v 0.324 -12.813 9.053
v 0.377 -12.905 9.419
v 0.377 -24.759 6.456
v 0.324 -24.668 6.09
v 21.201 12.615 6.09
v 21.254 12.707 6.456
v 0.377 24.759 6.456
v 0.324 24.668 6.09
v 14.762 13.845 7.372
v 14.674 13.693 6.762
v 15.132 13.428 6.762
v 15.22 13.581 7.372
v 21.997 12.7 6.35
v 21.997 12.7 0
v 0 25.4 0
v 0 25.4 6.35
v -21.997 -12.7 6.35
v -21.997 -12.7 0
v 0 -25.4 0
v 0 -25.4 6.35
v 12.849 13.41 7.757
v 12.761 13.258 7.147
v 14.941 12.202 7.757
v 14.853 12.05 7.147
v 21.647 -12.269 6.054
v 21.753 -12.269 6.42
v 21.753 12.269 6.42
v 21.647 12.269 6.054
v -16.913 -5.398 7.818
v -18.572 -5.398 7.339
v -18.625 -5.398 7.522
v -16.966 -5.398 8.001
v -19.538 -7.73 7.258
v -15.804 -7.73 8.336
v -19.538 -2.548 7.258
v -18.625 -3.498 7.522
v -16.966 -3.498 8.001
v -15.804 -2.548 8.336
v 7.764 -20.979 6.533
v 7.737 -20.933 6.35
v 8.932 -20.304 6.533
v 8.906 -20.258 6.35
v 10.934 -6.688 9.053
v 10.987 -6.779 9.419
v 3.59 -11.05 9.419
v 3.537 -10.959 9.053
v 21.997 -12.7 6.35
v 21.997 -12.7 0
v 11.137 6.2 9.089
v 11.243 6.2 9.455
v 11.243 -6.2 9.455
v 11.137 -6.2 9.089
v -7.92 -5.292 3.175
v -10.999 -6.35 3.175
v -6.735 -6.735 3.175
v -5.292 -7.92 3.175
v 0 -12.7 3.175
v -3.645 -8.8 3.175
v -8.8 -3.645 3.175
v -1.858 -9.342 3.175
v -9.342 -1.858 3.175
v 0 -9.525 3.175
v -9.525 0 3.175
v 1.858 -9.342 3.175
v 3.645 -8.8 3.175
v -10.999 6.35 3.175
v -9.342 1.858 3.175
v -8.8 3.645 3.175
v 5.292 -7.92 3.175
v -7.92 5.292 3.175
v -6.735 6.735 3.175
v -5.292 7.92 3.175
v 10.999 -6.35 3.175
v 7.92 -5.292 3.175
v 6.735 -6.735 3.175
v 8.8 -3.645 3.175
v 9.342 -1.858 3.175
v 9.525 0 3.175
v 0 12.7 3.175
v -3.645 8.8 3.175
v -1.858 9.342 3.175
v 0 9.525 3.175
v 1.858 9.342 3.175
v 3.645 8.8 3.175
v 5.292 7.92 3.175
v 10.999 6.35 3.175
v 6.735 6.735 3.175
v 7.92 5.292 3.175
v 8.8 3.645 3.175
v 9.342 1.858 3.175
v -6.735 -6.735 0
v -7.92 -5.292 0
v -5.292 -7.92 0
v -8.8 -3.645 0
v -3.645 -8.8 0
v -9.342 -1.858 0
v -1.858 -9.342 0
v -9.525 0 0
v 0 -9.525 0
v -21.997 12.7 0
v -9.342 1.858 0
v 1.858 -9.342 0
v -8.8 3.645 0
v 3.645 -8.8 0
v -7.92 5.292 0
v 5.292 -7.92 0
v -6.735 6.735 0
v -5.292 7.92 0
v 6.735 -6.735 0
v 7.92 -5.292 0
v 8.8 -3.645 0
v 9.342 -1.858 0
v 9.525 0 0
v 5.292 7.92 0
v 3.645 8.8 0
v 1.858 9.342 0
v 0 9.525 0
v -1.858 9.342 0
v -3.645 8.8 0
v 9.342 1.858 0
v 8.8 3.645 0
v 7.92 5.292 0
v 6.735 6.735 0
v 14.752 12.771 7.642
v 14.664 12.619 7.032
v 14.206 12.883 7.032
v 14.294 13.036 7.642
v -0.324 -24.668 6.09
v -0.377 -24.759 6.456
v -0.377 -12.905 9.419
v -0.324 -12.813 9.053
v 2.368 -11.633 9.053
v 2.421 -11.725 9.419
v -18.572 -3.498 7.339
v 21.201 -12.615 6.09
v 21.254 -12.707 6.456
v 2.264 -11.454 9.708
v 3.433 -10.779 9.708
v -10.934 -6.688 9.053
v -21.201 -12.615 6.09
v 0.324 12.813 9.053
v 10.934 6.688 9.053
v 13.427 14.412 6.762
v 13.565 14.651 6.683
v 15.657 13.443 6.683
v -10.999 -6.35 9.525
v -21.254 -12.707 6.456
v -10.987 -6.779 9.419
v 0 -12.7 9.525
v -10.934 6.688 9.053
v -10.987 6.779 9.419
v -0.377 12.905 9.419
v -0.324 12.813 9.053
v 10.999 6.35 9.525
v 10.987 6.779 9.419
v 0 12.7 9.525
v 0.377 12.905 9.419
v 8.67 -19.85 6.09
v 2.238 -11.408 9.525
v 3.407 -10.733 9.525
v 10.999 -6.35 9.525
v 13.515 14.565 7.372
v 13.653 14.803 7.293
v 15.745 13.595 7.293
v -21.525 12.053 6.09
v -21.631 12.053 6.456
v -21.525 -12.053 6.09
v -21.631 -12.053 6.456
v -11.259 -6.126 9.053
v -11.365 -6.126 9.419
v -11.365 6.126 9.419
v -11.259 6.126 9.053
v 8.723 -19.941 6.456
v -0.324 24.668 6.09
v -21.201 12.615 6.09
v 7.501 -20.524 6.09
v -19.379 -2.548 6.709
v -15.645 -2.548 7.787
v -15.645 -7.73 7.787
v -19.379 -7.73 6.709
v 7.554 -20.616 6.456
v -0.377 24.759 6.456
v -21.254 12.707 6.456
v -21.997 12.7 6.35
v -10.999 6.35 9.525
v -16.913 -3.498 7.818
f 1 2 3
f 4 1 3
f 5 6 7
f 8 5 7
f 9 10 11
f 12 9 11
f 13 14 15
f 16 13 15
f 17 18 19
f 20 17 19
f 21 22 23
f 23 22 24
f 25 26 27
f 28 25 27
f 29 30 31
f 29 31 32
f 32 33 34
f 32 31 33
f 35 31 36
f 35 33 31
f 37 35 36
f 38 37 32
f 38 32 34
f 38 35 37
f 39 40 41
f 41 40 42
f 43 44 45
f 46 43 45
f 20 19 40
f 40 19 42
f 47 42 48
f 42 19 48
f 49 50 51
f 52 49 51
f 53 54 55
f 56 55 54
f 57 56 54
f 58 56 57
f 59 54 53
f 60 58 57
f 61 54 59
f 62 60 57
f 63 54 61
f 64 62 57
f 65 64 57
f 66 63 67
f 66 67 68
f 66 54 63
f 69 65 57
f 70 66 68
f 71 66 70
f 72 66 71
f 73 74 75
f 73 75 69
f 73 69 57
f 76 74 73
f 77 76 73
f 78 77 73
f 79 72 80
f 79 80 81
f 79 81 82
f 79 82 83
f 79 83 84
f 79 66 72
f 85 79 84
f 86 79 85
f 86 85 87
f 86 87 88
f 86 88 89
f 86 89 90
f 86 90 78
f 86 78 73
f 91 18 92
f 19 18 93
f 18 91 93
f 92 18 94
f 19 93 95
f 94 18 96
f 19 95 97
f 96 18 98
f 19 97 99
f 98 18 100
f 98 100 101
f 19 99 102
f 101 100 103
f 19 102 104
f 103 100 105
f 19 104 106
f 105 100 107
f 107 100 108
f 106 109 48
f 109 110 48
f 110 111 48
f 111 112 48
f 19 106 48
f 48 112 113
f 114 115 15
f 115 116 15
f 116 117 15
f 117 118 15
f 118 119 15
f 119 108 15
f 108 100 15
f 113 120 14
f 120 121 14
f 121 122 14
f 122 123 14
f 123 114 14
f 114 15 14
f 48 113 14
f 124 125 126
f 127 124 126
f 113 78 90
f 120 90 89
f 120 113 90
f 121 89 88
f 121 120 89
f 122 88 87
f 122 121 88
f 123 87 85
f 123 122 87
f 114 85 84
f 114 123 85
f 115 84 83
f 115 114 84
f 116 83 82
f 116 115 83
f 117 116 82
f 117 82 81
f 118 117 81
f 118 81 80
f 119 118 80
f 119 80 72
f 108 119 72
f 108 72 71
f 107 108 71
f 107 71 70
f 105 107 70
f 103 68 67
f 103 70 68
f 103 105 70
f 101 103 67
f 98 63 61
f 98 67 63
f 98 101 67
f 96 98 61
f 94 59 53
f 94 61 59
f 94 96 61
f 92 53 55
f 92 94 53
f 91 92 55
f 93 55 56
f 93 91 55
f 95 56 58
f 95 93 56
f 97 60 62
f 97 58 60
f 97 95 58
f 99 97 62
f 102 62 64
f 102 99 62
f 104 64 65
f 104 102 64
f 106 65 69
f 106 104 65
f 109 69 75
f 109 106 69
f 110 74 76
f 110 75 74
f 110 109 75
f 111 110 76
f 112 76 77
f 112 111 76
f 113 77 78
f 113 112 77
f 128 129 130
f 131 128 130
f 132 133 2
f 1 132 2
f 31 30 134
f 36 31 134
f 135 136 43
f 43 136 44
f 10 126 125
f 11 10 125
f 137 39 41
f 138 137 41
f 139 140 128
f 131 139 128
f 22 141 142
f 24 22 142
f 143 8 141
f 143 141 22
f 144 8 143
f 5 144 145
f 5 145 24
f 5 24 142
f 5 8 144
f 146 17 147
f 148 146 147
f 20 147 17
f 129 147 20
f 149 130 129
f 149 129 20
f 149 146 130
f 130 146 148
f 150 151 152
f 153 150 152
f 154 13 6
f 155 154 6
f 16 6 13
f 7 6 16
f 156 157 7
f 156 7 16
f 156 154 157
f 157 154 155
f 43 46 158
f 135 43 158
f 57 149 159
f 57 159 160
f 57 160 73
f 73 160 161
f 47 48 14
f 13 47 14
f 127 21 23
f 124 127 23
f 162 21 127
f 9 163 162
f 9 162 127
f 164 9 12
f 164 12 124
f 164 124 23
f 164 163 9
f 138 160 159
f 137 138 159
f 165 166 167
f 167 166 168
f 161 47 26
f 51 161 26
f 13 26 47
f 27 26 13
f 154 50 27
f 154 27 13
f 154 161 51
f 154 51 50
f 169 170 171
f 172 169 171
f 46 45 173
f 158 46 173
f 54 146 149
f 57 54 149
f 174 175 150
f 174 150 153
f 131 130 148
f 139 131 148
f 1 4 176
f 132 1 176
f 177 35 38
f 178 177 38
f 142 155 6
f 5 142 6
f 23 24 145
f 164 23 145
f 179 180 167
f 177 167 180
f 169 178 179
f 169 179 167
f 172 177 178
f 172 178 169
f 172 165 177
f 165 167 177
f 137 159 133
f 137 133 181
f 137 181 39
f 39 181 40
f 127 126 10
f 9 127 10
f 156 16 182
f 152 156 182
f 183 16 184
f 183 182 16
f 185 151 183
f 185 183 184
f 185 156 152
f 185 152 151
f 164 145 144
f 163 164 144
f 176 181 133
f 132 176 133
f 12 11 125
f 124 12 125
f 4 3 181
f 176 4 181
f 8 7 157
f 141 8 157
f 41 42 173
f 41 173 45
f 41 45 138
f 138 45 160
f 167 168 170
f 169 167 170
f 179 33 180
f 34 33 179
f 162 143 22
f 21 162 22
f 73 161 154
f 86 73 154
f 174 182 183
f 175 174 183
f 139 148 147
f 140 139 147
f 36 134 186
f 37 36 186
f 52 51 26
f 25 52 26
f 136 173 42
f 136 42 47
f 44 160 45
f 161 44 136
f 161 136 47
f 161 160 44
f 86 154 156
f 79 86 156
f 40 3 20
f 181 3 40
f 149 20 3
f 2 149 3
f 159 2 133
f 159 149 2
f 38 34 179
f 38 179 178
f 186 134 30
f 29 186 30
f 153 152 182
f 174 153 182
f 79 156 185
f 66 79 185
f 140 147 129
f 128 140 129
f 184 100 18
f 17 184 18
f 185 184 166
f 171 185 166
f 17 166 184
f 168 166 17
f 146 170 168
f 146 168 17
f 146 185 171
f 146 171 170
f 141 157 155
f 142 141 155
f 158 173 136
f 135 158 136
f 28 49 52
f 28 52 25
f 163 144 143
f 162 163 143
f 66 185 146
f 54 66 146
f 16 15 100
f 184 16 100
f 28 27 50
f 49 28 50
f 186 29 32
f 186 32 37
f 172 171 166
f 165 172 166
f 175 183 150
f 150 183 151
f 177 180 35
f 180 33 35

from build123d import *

# Parameters (mm, degrees)
F0_R      = 9.525
F1_DEPTH  = 6.35
F2_R      = 9.525
F3_DEPTH  = 3.175
F8_DEPTH  = 6.35
F9_W      = 3.8866475224
F9_H      = 5.1821961533
F9_W_2    = 1.7273994163
F9_H_2    = 1.9001385663
F10_DEPTH = 0.1905
F12_DEPTH = 0.1905
F13_DEPTH = 0.381
F15_DEPTH = 0.381
F17_DEPTH = 0.381
F18_W     = 3.8866475224
F18_H     = 5.1821961533
F19_DEPTH = 0.381
F21_DEPTH = 0.381
F23_DEPTH = 0.381
F25_DEPTH = 0.635


# Not quite as in the source:
# - a feature names something its author has since deleted; it is built from what else it names


with BuildPart() as f1:
    # F0 (on Top) → F1 (new body)
    with BuildSketch(Plane.XY):
        Polygon((21.9970452561, 12.7), (0, 25.4), (-21.9970452561, 12.7), (-21.9970452561, -12.7), (0, -25.4), (21.9970452561, -12.7), align=None)
        Polygon((-10.9985226281, 6.35), (0, 12.7), (10.9985226281, 6.35), (10.9985226281, -6.35), (0, -12.7), (-10.9985226281, -6.35), align=None, mode=Mode.SUBTRACT)
        Polygon((10.9985226281, 6.35), (0, 12.7), (-10.9985226281, 6.35), (-10.9985226281, -6.35), (0, -12.7), (10.9985226281, -6.35), align=None)
        Circle(F0_R, mode=Mode.SUBTRACT)
    extrude(amount=F1_DEPTH)

    # F2 (on face) → F3 (join)
    with BuildSketch(Plane.XY.offset(6.35)):
        Polygon((-10.9985226281, 6.35), (-10.9985226281, -6.35), (0, -12.7), (10.9985226281, -6.35), (10.9985226281, 6.35), (0, 12.7), align=None)
        Circle(F2_R, mode=Mode.SUBTRACT)
    extrude(amount=F3_DEPTH)

    # F4 (on face) → F6 section 0
    with BuildSketch(Plane.XY.offset(6.35)):
        Polygon((0, -25.4), (21.9970452561, -12.7), (21.9970452561, 12.7), (0, 25.4), (-21.9970452561, 12.7), (-21.9970452561, -12.7), align=None)
    # F5 (on face) → F6 section 1
    with BuildSketch(Plane.XY.offset(9.525)):
        Polygon((0, -12.7), (10.9985226281, -6.35), (10.9985226281, 6.35), (0, 12.7), (-10.9985226281, 6.35), (-10.9985226281, -6.35), align=None)
    loft()

    # F8 (cut): a face of the model
    f8_faces = [f1.faces().sort_by_distance(p)[0] for p in [
        (0, 0, 9.525),
    ]]
    extrude(f8_faces, amount=-F8_DEPTH, mode=Mode.SUBTRACT)

    # F9 (on face) → F10 (join)
    with BuildSketch(Plane(origin=(-3.3841608086, 0, 11.7230769231), x_dir=(0.9607689228, 0, 0.2773500981), z_dir=(-0.2773500981, 0, 0.9607689228))):
        with Locations((-14.8150864989, -5.1390115405)):
            Rectangle(F9_W, F9_H)
        with Locations((-14.9446423166, -4.4480519136)):
            Rectangle(F9_W_2, F9_H_2, mode=Mode.SUBTRACT)
    extrude(amount=F10_DEPTH)

    # F11 (on face) → F12 (join)
    with BuildSketch(Plane(origin=(1.6920804043, -2.9307692308, 11.7230769231), x_dir=(0.9903379377, 0.0336336397, -0.1345345588), z_dir=(0.1386750491, -0.2401922307, 0.9607689228))):
        Polygon((1.7312151801, -8.1025979269), (0.5512164028, -8.7571434803), (6.1041303172, -18.7678014037), (7.2841290946, -18.1132558503), align=None)
    extrude(amount=F12_DEPTH)

    # F7 (on face) → F13 (cut)
    with BuildSketch(Plane(origin=(3.3841608086, 0, 11.7230769231), x_dir=(0.9607689228, 0, -0.2773500981), z_dir=(0.2773500981, 0, 0.9607689228))):
        Polygon((8.1792790536, 6.2004337374), (8.1792790536, -6.2004337374), (19.1189043532, -12.2686460377), (19.1189043532, 12.2686460377), align=None)
    extrude(amount=-F13_DEPTH, mode=Mode.SUBTRACT)

    # F14 (on face) → F15 (cut)
    with BuildSketch(Plane(origin=(1.6920804043, 2.9307692308, 11.7230769231), x_dir=(0.9903379377, -0.0336336397, -0.1345345588), z_dir=(0.1386750491, 0.2401922307, 0.9607689228))):
        Polygon((-1.3275888968, 22.4544873413), (-1.3275888968, 10.2350073173), (9.3858632247, 4.2922533233), (19.7524424685, 10.7613898066), align=None)
    extrude(amount=-F15_DEPTH, mode=Mode.SUBTRACT)

    # F16 (on face) → F17 (cut)
    with BuildSketch(Plane(origin=(-1.6920804043, 2.9307692308, 11.7230769231), x_dir=(0.9903379377, 0.0336336397, 0.1345345588), z_dir=(-0.1386750491, 0.2401922307, 0.9607689228))):
        Polygon((-19.7524424685, 10.7613898066), (-9.3858632247, 4.2922533233), (1.3275888968, 10.2350073173), (1.3275888968, 22.4544873413), align=None)
    extrude(amount=-F17_DEPTH, mode=Mode.SUBTRACT)

    # F18 (on face) → F19 (cut)
    with BuildSketch(Plane(origin=(-3.3841608086, 0, 11.7230769231), x_dir=(0.9607689228, 0, 0.2773500981), z_dir=(-0.2773500981, 0, 0.9607689228))):
        Polygon((-8.3062790536, 6.1256506061), (-18.9919043532, 12.0529690566), (-18.9919043532, -12.0529690566), (-8.3062790536, -6.1256506061), align=None)
        with Locations((-14.8150864989, -5.1390115405)):
            Rectangle(F18_W, F18_H, mode=Mode.SUBTRACT)
    extrude(amount=-F19_DEPTH, mode=Mode.SUBTRACT)

    # F20 (on face) → F21 (cut)
    with BuildSketch(Plane(origin=(-1.6920804043, -2.9307692308, 11.7230769231), x_dir=(0.9903379377, -0.0336336397, 0.1345345588), z_dir=(-0.1386750491, -0.2401922307, 0.9607689228))):
        Polygon((1.3275888968, -22.4544873413), (1.3275888968, -10.2350073173), (-9.3858632247, -4.2922533233), (-19.7524424685, -10.7613898066), align=None)
    extrude(amount=-F21_DEPTH, mode=Mode.SUBTRACT)

    # F22 (on face) → F23 (cut)
    with BuildSketch(Plane(origin=(1.6920804043, -2.9307692308, 11.7230769231), x_dir=(0.9903379377, 0.0336336397, -0.1345345588), z_dir=(0.1386750491, -0.2401922307, 0.9607689228))):
        Polygon((9.3858632247, -4.2922533233), (1.9160273264, -8.4357727618), (7.0993169483, -17.7800810155), (19.7524424685, -10.7613898066), align=None)
        Polygon((5.9193181709, -18.4346265688), (0.736028549, -9.0903183152), (-1.3275888968, -10.2350073173), (-1.3275888968, -22.4544873413), align=None)
    extrude(amount=-F23_DEPTH, mode=Mode.SUBTRACT)

    # F24 (on face) → F25 (join)
    with BuildSketch(Plane(origin=(1.6392452106, 2.8392559909, 11.3570239635), x_dir=(0.9903379377, -0.0336336397, -0.1345345588), z_dir=(0.1386750491, 0.2401922307, 0.9607689228))):
        Polygon((14.1548511611, 11.4204940112), (12.0419776672, 12.5925053529), (11.9030368338, 12.3420262032), (11.2298887321, 11.1284912051), (13.3427622261, 9.9564798634), align=None)
        Polygon((12.6895471254, 10.7929574783), (13.1615737293, 11.6439155403), (13.6242877942, 11.3872479577), (13.1522611902, 10.5362898958), align=None, mode=Mode.SUBTRACT)
    extrude(amount=F25_DEPTH)


solid = f1.part
